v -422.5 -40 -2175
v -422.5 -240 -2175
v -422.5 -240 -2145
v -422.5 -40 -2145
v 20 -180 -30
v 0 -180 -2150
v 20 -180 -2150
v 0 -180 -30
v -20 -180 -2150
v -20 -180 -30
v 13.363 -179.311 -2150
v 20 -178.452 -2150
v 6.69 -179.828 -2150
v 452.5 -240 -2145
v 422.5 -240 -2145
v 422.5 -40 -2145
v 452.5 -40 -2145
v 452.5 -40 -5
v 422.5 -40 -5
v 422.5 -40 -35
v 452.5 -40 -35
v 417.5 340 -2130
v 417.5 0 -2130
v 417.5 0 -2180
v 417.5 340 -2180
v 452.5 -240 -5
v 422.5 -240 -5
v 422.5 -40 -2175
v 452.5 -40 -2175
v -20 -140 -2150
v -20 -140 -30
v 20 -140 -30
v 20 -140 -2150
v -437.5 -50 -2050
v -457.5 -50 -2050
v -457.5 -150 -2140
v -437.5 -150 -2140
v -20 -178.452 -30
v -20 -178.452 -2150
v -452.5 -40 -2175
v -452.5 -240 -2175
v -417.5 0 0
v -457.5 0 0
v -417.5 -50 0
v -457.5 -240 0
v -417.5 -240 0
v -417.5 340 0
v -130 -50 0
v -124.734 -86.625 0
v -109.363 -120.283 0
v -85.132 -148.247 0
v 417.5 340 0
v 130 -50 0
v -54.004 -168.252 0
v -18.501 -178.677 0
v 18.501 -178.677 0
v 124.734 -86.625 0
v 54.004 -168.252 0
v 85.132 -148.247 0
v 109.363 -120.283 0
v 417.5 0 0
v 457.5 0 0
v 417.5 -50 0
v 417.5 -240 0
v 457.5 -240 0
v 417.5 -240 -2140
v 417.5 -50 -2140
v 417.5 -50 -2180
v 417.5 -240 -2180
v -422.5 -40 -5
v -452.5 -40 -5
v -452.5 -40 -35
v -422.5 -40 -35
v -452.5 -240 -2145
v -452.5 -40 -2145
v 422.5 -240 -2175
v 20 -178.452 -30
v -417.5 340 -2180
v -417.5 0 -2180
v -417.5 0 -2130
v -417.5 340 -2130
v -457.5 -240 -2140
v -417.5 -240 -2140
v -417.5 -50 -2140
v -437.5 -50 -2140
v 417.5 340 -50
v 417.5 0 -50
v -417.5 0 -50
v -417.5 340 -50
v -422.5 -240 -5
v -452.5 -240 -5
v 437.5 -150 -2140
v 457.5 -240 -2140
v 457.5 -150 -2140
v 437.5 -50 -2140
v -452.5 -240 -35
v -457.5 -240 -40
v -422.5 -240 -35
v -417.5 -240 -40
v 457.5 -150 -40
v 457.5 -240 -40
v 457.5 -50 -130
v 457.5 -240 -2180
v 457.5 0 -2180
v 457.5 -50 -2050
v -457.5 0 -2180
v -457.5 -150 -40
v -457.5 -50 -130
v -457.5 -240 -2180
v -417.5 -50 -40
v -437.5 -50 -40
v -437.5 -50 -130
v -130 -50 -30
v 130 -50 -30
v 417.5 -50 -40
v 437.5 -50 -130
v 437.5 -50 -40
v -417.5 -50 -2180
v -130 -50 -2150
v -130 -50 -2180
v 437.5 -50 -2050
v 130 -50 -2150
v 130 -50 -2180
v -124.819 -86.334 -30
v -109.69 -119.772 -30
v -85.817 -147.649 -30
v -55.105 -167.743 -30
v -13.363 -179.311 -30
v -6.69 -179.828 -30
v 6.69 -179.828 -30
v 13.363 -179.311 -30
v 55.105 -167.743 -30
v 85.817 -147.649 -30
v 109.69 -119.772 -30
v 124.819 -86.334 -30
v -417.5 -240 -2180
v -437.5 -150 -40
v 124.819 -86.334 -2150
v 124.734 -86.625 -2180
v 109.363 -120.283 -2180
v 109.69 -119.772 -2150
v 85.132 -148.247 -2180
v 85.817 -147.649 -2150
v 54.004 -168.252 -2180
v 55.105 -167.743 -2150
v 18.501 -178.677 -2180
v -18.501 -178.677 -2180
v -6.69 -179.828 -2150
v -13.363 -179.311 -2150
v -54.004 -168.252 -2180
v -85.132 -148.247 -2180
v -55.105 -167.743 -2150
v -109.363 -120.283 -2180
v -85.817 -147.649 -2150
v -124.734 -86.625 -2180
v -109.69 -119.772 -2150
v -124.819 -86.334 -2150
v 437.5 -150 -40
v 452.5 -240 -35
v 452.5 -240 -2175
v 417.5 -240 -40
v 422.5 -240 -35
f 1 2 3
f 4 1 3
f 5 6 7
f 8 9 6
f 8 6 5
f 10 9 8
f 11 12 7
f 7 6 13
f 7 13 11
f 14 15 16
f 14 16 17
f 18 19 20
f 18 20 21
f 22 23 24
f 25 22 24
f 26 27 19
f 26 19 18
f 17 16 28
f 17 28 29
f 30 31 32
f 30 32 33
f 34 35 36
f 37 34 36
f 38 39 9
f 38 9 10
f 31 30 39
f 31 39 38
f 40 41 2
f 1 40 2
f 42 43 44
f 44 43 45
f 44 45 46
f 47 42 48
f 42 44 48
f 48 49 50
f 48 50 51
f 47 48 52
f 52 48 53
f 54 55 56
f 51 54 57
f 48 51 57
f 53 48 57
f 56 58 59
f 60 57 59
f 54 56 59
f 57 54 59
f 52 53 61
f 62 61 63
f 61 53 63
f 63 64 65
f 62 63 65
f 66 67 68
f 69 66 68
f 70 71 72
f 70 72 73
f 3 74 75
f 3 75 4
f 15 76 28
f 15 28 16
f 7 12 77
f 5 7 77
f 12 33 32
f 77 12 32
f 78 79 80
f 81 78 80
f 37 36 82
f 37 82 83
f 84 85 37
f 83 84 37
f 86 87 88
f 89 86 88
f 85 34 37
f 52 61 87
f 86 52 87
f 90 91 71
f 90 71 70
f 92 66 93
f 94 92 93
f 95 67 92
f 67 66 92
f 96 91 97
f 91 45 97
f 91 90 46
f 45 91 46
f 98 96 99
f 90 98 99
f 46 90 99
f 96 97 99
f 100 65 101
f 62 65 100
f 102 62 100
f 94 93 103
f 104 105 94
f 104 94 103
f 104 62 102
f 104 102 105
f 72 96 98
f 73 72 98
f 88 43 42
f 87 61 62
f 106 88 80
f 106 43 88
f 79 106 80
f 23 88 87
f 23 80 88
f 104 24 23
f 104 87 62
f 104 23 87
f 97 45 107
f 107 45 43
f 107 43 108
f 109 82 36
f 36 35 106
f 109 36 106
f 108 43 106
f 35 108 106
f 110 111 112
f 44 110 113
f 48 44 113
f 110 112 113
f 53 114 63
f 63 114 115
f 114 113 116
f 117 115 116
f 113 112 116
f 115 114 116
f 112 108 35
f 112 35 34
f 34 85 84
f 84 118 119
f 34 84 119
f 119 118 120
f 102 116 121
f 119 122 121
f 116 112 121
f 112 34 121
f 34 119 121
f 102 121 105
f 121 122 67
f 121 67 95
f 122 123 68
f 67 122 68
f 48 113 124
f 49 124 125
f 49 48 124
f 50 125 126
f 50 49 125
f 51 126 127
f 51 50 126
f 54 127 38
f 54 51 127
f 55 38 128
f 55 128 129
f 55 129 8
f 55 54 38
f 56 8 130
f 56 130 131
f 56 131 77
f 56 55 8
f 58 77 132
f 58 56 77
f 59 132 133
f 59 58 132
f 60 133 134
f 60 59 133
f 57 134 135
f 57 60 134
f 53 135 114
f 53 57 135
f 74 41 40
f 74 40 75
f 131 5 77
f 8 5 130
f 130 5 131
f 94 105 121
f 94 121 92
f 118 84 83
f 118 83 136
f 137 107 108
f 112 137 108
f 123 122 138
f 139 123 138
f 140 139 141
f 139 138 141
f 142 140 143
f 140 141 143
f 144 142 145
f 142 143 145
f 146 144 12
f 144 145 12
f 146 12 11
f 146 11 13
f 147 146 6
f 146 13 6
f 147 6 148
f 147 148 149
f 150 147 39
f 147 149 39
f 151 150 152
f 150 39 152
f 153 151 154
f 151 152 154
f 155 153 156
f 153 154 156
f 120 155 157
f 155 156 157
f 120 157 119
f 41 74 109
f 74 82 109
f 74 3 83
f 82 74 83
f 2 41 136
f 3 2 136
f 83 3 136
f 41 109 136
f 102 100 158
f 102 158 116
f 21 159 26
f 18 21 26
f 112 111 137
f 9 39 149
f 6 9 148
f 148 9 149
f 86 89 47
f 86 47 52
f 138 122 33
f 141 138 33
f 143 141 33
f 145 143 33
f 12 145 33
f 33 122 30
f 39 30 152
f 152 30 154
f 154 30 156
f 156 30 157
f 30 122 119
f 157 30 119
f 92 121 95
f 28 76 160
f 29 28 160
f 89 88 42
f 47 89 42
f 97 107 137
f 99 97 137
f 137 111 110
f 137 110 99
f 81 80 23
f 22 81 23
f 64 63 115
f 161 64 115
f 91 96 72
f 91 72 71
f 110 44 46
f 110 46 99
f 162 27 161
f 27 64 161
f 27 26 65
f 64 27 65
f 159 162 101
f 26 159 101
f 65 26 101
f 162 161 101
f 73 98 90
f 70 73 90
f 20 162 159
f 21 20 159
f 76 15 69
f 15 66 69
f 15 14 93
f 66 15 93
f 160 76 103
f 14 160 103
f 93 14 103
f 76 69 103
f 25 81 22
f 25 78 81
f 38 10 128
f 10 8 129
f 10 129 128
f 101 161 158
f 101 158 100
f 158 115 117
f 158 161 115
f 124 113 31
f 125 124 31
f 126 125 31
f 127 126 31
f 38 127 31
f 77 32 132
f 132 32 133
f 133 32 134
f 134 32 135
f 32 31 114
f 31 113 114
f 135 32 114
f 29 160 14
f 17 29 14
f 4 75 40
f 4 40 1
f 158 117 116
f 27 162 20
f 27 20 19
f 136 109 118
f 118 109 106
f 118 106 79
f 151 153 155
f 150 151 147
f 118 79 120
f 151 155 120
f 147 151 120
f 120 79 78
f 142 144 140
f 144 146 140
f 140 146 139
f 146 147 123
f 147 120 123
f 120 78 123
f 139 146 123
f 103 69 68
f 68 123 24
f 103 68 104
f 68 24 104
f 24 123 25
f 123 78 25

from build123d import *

# Parameters (mm, degrees)
BOSS_EXTRUDE1_DEPTH      = 50
BOSS_EXTRUDE2_DEPTH      = 340
BOSS_EXTRUDE2_DEPTH_BACK = 50
SKETCH1_3_W              = 835
SKETCH1_3_H              = 50
SKETCH1_4_W              = 40
SKETCH1_4_H              = 40
BOSS_EXTRUDE3_DEPTH      = 240
BOSS_EXTRUDE4_DEPTH      = 20
BOSS_EXTRUDE5_DEPTH      = 20
SKETCH5_W                = 30
SKETCH5_H                = 30
CUT_EXTRUDE1_DEPTH       = 200
BOSS_EXTRUDE6_DEPTH      = 30
BOSS_EXTRUDE7_START      = -30
BOSS_EXTRUDE7_DEPTH      = 30
BOSS_EXTRUDE8_DEPTH      = 20
BOSS_EXTRUDE8_DEPTH_BACK = 20


with BuildPart() as part:
    # Sketch1 → Boss-Extrude1 (new body)
    with BuildSketch(Plane(origin=(0, 0, 0), x_dir=(1, 0, 0), z_dir=(0, 1, 0))):
        Polygon((-457.5, 40), (-417.5, 40), (-417.5, 50), (417.5, 50), (417.5, 40), (457.5, 40), (457.5, 2140), (417.5, 2140), (417.5, 2130), (-417.5, 2130), (-417.5, 2140), (-457.5, 2140), align=None)
    extrude(amount=-BOSS_EXTRUDE1_DEPTH)

    # Sketch1<3> → Boss-Extrude2 (add, two sides: drawn at the far end of the back side and taken through both)
    with BuildSketch(Plane(origin=(0, 0, 0), x_dir=(1, 0, 0), z_dir=(0, 1, 0)).offset(-BOSS_EXTRUDE2_DEPTH_BACK)):
        with Locations((0, 25)):
            Rectangle(SKETCH1_3_W, SKETCH1_3_H)
        with Locations((0, 2155)):
            Rectangle(SKETCH1_3_W, SKETCH1_3_H)
    extrude(amount=BOSS_EXTRUDE2_DEPTH + BOSS_EXTRUDE2_DEPTH_BACK)

    # Sketch1<4> → Boss-Extrude3 (add)
    with BuildSketch(Plane(origin=(0, 0, 0), x_dir=(1, 0, 0), z_dir=(0, 1, 0))):
        with Locations((-437.5, 20)):
            Rectangle(SKETCH1_4_W, SKETCH1_4_H)
        with Locations((437.5, 20)):
            Rectangle(SKETCH1_4_W, SKETCH1_4_H)
        with Locations((-437.5, 2160)):
            Rectangle(SKETCH1_4_W, SKETCH1_4_H)
        with Locations((437.5, 2160)):
            Rectangle(SKETCH1_4_W, SKETCH1_4_H)
    extrude(amount=-BOSS_EXTRUDE3_DEPTH)

    # Sketch3 → Boss-Extrude4 (add)
    with BuildSketch(Plane(origin=(457.5, 0, 0), x_dir=(0, 0, -1), z_dir=(1, 0, 0))):
        Polygon((40, -50), (40, -150), (130, -50), align=None)
        Polygon((2140, -50), (2050, -50), (2140, -150), align=None)
    extrude(amount=-BOSS_EXTRUDE4_DEPTH)

    # Sketch4 → Boss-Extrude5 (add)
    with BuildSketch(Plane(origin=(-457.5, 0, -45.75), x_dir=(0, 0, -1), z_dir=(1, 0, 0))):
        Polygon((-5.75, -50), (-5.75, -150), (84.25, -50), align=None)
        Polygon((2094.25, -50), (2004.25, -50), (2094.25, -150), align=None)
    extrude(amount=BOSS_EXTRUDE5_DEPTH)

    # Sketch5 → Cut-Extrude1 (cut)
    with BuildSketch(Plane.XZ.offset(240)):
        with Locations((-437.5, -2160)):
            Rectangle(SKETCH5_W, SKETCH5_H)
        with Locations((437.5, -2160)):
            Rectangle(SKETCH5_W, SKETCH5_H)
        with Locations((437.5, -20)):
            Rectangle(SKETCH5_W, SKETCH5_H)
        with Locations((-437.5, -20)):
            Rectangle(SKETCH5_W, SKETCH5_H)
    extrude(amount=-CUT_EXTRUDE1_DEPTH, mode=Mode.SUBTRACT)

    # Sketch6 → Boss-Extrude6 (add)
    with BuildSketch(Plane.XY):
        with BuildLine():
            Line((130, -50), (-130, -50))
            ThreePointArc((-130, -50), (0, -180), (130, -50))
        make_face()
    extrude(amount=-BOSS_EXTRUDE6_DEPTH)

    # Sketch7 → Boss-Extrude7 (add)
    with BuildSketch(Plane(origin=(0, 0, -2180), x_dir=(-1, 0, 0), z_dir=(0, 0, -1)).offset(BOSS_EXTRUDE7_START)):
        with BuildLine():
            Line((130, -50), (-130, -50))
            ThreePointArc((-130, -50), (0, -180), (130, -50))
        make_face()
    extrude(amount=BOSS_EXTRUDE7_DEPTH)

    # 3DSketch1 → Boss-Extrude8 (add, two sides: drawn at the far end of the back side and taken through both)
    with BuildSketch(Plane(origin=(0, -180, -30), x_dir=(0, 0.018864566947613626, -0.9998220482235222), z_dir=(1, 0, 0)).offset(-BOSS_EXTRUDE8_DEPTH_BACK)):
        Polygon((0, 0), (0.754582678, 39.992881929), (2120.377324912, 0), (2119.622742234, -39.992881929), align=None)
    extrude(amount=BOSS_EXTRUDE8_DEPTH + BOSS_EXTRUDE8_DEPTH_BACK)


solid = part.part
